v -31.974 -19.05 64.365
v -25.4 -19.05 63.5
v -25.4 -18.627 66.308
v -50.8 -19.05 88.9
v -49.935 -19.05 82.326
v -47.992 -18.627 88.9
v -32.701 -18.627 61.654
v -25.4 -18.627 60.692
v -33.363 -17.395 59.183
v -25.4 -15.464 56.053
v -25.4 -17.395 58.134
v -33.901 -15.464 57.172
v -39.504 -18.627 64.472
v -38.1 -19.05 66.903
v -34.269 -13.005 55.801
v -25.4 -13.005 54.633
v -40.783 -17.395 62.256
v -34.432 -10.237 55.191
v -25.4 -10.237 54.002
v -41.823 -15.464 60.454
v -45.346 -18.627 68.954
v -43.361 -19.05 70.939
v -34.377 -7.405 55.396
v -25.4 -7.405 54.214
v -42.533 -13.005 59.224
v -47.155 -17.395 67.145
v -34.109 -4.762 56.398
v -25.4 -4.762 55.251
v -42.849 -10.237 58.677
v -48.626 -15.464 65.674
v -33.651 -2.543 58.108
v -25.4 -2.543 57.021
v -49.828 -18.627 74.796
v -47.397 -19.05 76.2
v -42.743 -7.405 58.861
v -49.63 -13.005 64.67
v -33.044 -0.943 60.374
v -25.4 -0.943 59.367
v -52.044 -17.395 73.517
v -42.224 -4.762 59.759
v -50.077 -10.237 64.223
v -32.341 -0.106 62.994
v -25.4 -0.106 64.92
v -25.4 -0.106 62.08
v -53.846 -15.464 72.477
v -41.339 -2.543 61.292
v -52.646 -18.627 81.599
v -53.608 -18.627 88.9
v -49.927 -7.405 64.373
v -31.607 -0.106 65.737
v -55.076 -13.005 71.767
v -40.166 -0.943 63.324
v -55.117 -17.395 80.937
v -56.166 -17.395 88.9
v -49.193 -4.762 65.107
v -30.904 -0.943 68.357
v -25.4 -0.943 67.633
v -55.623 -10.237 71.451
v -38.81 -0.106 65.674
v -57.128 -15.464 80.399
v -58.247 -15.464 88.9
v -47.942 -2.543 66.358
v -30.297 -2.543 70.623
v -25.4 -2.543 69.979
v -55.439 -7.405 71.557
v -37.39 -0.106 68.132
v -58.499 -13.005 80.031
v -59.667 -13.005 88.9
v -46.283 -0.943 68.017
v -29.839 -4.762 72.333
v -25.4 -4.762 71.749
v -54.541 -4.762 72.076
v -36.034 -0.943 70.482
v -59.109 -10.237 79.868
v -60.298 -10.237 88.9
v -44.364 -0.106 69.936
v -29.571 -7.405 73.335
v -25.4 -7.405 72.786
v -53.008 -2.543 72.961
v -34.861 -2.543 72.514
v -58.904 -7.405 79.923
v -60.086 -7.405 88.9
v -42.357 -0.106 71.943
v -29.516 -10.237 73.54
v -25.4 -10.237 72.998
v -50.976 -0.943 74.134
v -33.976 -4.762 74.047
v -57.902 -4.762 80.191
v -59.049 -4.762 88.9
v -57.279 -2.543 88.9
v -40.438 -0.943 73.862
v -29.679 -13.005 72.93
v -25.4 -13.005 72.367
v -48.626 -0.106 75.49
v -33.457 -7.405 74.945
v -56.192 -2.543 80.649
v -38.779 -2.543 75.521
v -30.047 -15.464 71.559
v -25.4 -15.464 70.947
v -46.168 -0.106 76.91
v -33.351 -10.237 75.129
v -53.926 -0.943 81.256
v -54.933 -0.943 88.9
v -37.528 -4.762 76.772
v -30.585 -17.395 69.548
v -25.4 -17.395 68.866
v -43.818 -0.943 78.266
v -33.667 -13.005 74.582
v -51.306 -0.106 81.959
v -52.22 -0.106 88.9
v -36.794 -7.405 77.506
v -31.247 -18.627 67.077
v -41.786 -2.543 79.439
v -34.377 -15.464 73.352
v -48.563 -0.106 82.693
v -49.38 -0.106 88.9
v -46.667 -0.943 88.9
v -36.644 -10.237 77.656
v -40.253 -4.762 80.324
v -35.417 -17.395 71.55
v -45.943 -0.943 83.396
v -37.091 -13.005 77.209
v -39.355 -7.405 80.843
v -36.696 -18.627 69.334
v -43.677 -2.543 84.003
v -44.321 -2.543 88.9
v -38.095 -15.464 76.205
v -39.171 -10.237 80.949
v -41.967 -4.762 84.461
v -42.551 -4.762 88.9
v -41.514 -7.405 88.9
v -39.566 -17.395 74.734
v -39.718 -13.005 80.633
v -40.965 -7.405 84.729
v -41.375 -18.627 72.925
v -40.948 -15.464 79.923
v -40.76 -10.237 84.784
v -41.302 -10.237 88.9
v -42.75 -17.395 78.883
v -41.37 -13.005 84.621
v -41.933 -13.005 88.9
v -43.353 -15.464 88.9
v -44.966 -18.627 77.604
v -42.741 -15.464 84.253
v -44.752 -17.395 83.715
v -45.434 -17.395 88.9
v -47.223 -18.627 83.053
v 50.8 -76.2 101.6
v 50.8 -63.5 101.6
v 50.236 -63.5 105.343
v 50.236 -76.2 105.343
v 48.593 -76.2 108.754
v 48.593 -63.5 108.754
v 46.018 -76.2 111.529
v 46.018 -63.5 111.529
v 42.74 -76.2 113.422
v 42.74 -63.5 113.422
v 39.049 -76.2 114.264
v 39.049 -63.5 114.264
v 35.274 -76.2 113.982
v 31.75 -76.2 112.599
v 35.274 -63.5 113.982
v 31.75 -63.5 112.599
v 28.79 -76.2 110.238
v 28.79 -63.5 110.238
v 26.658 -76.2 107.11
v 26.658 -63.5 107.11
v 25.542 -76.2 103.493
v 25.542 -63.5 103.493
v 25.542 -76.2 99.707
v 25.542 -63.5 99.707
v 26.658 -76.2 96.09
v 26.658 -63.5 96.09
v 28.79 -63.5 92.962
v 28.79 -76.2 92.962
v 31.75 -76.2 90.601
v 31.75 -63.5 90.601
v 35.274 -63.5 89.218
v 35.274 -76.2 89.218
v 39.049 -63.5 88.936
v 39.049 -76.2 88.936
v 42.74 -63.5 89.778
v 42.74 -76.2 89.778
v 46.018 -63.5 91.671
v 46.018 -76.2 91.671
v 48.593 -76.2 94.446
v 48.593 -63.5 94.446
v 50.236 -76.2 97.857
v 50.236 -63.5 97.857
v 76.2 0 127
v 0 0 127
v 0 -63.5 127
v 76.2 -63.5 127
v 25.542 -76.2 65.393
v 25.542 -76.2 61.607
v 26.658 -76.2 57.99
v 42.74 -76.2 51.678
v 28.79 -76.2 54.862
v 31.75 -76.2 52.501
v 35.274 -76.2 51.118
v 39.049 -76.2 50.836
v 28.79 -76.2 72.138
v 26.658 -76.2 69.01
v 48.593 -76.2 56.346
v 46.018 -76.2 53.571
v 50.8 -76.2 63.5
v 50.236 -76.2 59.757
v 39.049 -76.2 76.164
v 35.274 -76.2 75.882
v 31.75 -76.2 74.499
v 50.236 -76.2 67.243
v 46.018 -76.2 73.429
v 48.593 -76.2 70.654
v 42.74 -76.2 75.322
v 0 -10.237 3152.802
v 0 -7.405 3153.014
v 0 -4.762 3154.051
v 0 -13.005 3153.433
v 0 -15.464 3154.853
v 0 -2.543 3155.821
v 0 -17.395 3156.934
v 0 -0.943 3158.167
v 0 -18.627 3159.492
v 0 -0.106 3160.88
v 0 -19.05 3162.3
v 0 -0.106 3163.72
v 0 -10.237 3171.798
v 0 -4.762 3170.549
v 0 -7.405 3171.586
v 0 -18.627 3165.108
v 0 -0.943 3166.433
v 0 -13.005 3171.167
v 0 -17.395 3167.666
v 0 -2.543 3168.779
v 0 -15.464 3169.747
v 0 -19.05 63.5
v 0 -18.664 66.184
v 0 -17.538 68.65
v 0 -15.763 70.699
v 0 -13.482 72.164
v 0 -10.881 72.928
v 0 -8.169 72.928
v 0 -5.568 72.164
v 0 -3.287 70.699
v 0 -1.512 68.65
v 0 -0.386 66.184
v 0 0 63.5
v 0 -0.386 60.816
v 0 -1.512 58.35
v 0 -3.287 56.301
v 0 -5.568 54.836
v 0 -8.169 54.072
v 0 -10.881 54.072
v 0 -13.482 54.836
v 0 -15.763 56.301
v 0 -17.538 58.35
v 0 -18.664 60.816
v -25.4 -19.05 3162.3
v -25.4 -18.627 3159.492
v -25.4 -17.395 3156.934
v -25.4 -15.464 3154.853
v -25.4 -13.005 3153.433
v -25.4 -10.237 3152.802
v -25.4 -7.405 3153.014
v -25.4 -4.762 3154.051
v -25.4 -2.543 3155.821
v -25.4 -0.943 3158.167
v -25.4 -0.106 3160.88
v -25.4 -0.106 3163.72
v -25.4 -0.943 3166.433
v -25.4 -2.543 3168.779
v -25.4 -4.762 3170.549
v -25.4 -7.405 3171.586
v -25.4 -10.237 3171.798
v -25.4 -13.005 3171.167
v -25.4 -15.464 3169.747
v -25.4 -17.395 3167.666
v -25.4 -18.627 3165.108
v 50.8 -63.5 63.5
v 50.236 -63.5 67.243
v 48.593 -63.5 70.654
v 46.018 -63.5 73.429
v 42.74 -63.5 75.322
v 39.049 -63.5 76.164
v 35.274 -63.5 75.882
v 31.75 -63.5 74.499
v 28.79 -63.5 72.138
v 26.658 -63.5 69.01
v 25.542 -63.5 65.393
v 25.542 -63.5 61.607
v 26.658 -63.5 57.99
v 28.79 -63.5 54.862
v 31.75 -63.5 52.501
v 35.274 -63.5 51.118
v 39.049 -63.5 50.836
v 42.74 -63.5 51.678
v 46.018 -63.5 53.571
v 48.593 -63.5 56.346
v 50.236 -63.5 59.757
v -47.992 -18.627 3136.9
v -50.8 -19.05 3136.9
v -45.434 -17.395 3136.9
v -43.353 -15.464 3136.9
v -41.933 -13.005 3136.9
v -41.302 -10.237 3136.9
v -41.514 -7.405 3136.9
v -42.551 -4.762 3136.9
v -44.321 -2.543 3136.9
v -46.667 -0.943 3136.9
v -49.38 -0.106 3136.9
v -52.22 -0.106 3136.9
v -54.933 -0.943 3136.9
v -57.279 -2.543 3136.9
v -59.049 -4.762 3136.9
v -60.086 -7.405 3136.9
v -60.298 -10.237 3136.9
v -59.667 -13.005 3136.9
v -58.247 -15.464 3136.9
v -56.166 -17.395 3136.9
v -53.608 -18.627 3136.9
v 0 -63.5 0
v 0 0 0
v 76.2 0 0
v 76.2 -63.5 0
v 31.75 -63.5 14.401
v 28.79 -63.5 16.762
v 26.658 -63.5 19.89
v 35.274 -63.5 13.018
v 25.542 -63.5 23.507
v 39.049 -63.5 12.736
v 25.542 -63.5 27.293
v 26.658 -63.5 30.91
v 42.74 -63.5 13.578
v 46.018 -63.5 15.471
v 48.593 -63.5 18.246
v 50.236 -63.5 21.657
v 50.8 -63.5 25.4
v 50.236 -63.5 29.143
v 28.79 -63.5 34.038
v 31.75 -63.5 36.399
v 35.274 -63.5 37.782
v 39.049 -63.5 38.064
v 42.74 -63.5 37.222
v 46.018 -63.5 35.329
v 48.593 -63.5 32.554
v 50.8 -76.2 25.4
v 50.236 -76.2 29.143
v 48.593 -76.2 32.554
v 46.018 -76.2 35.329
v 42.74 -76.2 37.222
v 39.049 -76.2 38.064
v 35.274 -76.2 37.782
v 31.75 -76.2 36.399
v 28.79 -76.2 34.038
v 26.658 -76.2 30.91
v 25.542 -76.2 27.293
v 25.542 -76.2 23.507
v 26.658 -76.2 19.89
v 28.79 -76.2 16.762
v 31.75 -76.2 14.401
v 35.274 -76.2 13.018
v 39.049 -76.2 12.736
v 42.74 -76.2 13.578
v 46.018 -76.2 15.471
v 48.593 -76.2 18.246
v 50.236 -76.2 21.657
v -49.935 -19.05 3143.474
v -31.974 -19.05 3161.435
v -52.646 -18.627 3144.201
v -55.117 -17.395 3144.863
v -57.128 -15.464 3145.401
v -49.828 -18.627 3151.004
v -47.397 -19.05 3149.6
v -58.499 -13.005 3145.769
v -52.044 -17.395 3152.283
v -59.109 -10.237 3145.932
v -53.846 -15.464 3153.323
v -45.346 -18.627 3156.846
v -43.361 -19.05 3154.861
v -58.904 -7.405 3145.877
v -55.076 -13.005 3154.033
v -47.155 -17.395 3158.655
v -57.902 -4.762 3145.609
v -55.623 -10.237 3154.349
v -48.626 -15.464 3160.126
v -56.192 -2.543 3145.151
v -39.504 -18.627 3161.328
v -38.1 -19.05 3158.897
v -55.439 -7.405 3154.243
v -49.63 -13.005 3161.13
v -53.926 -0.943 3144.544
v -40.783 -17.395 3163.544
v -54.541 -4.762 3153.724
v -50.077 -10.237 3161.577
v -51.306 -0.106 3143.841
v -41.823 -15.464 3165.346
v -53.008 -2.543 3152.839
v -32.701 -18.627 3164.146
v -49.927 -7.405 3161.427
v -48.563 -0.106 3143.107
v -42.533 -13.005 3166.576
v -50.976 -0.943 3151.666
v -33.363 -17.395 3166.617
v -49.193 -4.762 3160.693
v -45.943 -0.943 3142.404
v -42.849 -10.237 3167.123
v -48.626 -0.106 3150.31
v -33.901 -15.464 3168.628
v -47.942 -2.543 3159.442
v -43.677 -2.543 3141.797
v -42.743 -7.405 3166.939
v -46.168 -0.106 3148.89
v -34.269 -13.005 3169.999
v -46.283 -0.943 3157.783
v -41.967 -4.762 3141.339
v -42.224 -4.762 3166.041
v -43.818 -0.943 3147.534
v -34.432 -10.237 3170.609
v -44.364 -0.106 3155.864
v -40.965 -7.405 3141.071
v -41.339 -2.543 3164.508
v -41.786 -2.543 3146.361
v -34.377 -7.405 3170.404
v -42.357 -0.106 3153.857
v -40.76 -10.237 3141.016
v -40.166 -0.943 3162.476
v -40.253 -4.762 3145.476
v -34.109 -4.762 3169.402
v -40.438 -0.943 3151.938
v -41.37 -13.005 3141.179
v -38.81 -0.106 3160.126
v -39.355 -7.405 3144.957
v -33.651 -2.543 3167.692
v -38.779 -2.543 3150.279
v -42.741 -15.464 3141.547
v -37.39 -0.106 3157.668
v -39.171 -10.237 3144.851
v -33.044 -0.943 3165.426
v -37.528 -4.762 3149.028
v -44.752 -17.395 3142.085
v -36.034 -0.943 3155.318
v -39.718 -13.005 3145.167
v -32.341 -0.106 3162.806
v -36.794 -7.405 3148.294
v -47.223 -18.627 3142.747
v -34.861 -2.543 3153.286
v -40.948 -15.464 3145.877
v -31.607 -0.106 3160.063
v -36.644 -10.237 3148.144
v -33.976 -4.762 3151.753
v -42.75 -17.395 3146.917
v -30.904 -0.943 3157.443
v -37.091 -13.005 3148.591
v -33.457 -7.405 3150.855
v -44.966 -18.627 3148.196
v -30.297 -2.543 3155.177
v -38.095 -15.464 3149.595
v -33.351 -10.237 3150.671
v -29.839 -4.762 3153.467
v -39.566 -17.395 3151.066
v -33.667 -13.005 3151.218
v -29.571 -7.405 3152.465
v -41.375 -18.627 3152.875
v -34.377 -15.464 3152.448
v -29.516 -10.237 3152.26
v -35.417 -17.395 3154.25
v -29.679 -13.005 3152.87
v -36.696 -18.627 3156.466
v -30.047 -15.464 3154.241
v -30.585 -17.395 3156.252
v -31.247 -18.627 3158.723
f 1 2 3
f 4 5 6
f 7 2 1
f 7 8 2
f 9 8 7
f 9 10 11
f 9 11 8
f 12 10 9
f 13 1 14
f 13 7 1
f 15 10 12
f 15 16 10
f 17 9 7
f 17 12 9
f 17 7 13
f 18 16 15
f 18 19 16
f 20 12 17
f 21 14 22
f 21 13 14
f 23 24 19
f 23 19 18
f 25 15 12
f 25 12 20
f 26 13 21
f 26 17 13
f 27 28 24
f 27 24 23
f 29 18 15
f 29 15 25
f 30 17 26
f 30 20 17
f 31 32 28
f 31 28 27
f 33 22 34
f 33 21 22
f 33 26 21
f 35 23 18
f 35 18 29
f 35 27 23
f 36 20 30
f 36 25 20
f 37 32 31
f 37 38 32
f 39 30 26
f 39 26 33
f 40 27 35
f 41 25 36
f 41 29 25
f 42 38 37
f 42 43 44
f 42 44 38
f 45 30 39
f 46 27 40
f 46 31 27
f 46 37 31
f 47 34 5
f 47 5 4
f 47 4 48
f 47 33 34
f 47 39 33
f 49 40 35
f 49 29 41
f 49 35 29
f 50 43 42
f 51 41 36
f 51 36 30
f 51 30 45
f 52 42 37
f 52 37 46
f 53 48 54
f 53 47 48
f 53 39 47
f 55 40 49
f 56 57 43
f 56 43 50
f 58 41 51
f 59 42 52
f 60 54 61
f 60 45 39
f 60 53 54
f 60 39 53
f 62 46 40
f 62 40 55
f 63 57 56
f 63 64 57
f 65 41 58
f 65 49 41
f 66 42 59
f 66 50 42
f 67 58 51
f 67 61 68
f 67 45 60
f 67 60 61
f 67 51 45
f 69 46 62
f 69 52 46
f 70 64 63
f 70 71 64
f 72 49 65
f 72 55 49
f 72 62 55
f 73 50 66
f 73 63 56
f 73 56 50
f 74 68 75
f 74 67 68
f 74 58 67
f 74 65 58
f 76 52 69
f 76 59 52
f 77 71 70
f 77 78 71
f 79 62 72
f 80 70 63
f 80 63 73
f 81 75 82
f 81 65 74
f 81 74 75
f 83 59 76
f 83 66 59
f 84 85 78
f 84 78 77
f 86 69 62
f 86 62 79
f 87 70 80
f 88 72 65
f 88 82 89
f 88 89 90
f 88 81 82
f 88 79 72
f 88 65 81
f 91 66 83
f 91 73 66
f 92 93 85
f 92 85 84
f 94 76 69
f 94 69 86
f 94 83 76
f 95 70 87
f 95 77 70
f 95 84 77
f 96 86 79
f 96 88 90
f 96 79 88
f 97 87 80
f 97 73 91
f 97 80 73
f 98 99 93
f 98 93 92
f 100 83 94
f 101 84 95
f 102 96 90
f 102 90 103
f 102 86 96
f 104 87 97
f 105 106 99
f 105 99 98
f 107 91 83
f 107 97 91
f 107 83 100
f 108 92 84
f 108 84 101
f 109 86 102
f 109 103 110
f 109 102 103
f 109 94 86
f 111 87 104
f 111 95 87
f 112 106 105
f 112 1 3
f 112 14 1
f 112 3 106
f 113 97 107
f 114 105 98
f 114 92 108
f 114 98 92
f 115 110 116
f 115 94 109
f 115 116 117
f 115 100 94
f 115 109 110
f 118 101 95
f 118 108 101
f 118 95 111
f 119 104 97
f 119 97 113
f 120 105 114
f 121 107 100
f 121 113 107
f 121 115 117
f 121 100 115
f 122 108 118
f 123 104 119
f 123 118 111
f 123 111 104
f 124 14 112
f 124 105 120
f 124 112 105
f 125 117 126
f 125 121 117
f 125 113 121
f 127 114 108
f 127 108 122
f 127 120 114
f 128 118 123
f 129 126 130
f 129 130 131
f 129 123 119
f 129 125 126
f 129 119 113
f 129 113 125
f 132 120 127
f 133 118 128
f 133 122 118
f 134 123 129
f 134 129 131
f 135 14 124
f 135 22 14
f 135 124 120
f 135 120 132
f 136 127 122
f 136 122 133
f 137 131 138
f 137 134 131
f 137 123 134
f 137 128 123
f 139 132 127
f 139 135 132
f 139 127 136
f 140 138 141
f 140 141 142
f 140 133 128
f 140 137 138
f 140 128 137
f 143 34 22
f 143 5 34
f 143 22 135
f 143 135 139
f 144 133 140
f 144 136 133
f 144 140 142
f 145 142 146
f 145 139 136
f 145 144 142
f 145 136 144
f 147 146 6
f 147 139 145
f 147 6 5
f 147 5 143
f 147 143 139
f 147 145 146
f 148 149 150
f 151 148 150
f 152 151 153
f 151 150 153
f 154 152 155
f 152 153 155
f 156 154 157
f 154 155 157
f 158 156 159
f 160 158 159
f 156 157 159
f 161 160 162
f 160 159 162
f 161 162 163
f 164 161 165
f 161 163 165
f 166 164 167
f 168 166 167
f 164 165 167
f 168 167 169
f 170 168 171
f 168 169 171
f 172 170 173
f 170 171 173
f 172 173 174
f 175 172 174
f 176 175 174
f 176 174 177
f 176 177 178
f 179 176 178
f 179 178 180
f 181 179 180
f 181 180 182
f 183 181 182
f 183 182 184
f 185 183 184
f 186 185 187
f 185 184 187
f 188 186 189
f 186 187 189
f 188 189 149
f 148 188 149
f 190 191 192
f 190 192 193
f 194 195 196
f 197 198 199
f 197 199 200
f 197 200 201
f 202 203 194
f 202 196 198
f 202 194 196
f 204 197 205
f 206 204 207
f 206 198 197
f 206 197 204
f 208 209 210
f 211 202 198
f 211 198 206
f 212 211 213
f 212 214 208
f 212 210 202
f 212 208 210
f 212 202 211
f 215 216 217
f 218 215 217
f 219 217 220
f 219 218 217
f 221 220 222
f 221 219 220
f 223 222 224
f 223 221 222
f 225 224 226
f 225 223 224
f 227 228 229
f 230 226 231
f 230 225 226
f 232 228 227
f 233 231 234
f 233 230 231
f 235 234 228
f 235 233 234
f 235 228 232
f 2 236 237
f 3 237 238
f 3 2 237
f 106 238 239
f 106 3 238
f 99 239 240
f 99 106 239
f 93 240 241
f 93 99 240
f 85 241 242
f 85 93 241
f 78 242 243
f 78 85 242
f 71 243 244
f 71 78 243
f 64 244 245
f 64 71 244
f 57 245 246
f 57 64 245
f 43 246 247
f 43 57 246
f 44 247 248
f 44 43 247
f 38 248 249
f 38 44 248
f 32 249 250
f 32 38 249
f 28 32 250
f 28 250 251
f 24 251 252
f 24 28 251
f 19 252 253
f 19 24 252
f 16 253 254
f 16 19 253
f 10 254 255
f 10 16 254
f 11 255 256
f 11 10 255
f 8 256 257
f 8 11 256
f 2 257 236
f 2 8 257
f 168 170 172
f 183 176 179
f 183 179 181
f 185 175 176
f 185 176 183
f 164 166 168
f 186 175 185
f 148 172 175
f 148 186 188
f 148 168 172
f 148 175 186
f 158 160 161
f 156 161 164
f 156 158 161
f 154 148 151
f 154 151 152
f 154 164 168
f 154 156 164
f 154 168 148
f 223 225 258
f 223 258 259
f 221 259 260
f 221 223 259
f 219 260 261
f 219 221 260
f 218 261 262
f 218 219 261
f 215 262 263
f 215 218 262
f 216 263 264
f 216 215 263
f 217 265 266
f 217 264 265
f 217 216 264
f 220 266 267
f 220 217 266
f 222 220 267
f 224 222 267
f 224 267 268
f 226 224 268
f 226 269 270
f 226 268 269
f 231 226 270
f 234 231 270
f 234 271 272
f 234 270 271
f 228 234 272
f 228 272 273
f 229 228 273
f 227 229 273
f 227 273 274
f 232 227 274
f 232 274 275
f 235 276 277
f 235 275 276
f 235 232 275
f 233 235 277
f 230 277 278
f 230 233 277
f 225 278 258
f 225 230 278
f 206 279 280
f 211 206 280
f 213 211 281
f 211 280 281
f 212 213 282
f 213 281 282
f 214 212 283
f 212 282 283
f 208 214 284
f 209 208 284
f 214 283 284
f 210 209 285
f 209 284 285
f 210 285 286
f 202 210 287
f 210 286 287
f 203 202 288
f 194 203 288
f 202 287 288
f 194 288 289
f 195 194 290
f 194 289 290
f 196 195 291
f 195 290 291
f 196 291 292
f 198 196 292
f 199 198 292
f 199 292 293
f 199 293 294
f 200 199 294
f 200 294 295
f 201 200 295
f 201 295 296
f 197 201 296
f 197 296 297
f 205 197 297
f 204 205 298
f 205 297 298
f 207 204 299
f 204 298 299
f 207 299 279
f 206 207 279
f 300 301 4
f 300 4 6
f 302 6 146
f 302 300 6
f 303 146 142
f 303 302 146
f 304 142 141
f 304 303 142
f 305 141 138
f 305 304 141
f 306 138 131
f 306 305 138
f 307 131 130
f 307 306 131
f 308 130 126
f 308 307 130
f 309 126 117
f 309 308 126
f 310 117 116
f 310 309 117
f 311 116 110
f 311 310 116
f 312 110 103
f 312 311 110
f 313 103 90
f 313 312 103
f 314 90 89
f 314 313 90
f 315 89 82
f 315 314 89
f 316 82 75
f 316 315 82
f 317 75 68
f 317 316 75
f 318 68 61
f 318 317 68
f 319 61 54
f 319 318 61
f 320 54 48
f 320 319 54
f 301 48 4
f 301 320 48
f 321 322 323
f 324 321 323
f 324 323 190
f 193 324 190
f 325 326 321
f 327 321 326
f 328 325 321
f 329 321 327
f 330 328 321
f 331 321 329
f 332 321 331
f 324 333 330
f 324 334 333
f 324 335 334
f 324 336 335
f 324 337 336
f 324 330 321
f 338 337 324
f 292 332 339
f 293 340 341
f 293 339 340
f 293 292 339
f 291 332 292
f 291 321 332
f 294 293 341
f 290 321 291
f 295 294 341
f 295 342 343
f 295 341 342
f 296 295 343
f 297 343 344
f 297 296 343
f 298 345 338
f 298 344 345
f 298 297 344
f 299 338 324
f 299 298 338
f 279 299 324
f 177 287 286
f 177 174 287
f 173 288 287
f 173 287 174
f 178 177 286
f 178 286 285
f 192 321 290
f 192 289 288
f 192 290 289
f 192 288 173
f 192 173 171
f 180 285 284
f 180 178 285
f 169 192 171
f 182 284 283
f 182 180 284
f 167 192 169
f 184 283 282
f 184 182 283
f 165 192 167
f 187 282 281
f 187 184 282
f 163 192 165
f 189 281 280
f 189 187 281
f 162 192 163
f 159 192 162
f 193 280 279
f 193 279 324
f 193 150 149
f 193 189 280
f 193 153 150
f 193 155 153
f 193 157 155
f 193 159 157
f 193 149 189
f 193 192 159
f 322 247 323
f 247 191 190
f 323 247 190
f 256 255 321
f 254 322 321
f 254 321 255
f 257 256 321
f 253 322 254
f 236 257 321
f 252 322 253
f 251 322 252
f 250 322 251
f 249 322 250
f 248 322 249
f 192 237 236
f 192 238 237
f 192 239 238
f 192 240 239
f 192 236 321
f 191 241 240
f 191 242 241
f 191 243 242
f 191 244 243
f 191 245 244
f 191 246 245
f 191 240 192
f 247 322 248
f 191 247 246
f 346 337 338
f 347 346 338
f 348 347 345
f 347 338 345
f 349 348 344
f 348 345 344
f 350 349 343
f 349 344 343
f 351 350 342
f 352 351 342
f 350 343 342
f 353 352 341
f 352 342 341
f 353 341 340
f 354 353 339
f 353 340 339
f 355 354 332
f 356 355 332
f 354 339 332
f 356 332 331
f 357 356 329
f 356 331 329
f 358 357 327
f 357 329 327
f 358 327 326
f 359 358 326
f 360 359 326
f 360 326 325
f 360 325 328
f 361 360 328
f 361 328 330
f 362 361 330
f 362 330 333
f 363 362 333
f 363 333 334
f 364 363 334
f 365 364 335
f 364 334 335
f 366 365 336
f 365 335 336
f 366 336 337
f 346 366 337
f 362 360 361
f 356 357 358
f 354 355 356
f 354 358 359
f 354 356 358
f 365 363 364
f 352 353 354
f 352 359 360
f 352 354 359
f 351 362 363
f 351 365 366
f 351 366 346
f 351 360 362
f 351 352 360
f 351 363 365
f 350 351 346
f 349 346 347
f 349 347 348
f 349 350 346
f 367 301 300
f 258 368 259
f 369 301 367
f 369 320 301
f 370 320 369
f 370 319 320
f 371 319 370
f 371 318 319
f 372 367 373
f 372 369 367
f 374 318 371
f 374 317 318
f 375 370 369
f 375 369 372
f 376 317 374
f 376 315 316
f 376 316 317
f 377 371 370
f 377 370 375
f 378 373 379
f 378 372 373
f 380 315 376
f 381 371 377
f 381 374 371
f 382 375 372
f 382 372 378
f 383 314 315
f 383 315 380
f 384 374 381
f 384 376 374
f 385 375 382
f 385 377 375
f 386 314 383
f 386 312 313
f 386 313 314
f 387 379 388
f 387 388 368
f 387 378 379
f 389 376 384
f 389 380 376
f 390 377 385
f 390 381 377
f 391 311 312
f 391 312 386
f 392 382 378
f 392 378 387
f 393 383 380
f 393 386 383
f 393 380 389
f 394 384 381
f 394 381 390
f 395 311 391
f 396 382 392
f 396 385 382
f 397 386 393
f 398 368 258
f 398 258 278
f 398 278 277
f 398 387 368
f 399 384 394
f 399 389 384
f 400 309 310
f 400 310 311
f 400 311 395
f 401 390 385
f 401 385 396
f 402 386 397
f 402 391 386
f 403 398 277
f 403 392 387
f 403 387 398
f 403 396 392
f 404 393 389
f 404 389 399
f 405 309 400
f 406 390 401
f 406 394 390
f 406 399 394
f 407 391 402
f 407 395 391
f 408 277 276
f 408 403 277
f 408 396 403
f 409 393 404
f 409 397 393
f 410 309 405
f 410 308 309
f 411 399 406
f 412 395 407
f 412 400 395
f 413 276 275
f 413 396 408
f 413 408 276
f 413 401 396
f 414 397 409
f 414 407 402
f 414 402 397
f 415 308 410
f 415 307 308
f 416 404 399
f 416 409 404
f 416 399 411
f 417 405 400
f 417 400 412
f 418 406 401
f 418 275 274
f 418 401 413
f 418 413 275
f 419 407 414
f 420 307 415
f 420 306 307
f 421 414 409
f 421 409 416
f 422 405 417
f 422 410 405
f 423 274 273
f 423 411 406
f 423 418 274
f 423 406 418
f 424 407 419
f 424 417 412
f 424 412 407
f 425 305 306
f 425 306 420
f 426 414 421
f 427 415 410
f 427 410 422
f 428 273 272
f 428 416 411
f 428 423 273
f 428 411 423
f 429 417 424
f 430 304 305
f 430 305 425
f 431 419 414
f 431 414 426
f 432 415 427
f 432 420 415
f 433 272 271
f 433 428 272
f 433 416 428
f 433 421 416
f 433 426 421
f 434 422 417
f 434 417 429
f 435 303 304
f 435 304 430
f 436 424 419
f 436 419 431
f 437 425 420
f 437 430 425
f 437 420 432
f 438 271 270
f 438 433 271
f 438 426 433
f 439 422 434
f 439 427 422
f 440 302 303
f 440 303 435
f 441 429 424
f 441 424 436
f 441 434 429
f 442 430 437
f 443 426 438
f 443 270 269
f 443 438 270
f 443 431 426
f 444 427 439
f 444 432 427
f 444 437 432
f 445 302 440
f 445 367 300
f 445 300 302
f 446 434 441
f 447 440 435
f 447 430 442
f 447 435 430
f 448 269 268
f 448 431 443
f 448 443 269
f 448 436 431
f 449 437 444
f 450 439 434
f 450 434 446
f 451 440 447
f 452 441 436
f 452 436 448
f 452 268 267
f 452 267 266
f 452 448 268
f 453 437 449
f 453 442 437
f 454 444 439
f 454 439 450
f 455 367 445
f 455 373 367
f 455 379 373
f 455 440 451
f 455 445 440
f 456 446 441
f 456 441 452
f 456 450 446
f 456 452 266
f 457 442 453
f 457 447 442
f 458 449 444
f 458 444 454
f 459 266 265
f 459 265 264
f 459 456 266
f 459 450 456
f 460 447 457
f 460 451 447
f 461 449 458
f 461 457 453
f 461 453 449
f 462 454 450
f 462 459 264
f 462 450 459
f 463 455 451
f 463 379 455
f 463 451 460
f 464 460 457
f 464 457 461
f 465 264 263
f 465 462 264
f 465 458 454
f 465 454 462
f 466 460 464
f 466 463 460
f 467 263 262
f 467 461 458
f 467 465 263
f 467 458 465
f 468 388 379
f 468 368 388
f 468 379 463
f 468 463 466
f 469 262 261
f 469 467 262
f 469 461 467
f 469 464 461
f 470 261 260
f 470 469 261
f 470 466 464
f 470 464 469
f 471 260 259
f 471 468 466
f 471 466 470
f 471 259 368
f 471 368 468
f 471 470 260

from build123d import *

# Parameters (mm, degrees)
F0_W     = 76.2
F0_H     = 127
F1_DEPTH = 63.5
F2_R     = 12.7
F3_DEPTH = 12.7


with BuildPart() as f1:
    # F0 (on Front) → F1 (new body)
    with BuildSketch(Plane.XZ):
        with Locations((38.1, 63.5)):
            Rectangle(F0_W, F0_H)
    extrude(amount=F1_DEPTH)

    # F2 (on face) → F3 (join)
    with BuildSketch(Plane.XZ.offset(63.5)):
        with Locations((38.1, 25.4)):
            Circle(F2_R)
        with Locations((38.1, 101.6)):
            Circle(F2_R)
        with Locations((38.1, 63.5)):
            Circle(F2_R)
    extrude(amount=F3_DEPTH)

    # F7: sweep along a path in F5
    with BuildLine(Plane.XZ.offset(9.525)) as f7_path:
        Line((0, 63.5), (-25.4, 63.5))
        ThreePointArc((-25.4, 63.5), (-43.360512, 70.939488), (-50.8, 88.9))
        Line((-50.8, 88.9), (-50.8, 3136.9))
        ThreePointArc((-50.8, 3136.9), (-43.360512, 3154.860512), (-25.4, 3162.3))
        Line((-25.4, 3162.3), (0, 3162.3))
    # F6 (on face) → F7 (sweep)
    with BuildSketch(Plane(origin=(0, 0, 0), x_dir=(0, -1, 0), z_dir=(-1, 0, 0))):
        with BuildLine():
            ThreePointArc((0, 63.5), (9.525, 53.975), (19.05, 63.5))
            ThreePointArc((19.05, 63.5), (9.525, 73.025), (0, 63.5))
        make_face()
    sweep(path=f7_path.line)


solid = f1.part
